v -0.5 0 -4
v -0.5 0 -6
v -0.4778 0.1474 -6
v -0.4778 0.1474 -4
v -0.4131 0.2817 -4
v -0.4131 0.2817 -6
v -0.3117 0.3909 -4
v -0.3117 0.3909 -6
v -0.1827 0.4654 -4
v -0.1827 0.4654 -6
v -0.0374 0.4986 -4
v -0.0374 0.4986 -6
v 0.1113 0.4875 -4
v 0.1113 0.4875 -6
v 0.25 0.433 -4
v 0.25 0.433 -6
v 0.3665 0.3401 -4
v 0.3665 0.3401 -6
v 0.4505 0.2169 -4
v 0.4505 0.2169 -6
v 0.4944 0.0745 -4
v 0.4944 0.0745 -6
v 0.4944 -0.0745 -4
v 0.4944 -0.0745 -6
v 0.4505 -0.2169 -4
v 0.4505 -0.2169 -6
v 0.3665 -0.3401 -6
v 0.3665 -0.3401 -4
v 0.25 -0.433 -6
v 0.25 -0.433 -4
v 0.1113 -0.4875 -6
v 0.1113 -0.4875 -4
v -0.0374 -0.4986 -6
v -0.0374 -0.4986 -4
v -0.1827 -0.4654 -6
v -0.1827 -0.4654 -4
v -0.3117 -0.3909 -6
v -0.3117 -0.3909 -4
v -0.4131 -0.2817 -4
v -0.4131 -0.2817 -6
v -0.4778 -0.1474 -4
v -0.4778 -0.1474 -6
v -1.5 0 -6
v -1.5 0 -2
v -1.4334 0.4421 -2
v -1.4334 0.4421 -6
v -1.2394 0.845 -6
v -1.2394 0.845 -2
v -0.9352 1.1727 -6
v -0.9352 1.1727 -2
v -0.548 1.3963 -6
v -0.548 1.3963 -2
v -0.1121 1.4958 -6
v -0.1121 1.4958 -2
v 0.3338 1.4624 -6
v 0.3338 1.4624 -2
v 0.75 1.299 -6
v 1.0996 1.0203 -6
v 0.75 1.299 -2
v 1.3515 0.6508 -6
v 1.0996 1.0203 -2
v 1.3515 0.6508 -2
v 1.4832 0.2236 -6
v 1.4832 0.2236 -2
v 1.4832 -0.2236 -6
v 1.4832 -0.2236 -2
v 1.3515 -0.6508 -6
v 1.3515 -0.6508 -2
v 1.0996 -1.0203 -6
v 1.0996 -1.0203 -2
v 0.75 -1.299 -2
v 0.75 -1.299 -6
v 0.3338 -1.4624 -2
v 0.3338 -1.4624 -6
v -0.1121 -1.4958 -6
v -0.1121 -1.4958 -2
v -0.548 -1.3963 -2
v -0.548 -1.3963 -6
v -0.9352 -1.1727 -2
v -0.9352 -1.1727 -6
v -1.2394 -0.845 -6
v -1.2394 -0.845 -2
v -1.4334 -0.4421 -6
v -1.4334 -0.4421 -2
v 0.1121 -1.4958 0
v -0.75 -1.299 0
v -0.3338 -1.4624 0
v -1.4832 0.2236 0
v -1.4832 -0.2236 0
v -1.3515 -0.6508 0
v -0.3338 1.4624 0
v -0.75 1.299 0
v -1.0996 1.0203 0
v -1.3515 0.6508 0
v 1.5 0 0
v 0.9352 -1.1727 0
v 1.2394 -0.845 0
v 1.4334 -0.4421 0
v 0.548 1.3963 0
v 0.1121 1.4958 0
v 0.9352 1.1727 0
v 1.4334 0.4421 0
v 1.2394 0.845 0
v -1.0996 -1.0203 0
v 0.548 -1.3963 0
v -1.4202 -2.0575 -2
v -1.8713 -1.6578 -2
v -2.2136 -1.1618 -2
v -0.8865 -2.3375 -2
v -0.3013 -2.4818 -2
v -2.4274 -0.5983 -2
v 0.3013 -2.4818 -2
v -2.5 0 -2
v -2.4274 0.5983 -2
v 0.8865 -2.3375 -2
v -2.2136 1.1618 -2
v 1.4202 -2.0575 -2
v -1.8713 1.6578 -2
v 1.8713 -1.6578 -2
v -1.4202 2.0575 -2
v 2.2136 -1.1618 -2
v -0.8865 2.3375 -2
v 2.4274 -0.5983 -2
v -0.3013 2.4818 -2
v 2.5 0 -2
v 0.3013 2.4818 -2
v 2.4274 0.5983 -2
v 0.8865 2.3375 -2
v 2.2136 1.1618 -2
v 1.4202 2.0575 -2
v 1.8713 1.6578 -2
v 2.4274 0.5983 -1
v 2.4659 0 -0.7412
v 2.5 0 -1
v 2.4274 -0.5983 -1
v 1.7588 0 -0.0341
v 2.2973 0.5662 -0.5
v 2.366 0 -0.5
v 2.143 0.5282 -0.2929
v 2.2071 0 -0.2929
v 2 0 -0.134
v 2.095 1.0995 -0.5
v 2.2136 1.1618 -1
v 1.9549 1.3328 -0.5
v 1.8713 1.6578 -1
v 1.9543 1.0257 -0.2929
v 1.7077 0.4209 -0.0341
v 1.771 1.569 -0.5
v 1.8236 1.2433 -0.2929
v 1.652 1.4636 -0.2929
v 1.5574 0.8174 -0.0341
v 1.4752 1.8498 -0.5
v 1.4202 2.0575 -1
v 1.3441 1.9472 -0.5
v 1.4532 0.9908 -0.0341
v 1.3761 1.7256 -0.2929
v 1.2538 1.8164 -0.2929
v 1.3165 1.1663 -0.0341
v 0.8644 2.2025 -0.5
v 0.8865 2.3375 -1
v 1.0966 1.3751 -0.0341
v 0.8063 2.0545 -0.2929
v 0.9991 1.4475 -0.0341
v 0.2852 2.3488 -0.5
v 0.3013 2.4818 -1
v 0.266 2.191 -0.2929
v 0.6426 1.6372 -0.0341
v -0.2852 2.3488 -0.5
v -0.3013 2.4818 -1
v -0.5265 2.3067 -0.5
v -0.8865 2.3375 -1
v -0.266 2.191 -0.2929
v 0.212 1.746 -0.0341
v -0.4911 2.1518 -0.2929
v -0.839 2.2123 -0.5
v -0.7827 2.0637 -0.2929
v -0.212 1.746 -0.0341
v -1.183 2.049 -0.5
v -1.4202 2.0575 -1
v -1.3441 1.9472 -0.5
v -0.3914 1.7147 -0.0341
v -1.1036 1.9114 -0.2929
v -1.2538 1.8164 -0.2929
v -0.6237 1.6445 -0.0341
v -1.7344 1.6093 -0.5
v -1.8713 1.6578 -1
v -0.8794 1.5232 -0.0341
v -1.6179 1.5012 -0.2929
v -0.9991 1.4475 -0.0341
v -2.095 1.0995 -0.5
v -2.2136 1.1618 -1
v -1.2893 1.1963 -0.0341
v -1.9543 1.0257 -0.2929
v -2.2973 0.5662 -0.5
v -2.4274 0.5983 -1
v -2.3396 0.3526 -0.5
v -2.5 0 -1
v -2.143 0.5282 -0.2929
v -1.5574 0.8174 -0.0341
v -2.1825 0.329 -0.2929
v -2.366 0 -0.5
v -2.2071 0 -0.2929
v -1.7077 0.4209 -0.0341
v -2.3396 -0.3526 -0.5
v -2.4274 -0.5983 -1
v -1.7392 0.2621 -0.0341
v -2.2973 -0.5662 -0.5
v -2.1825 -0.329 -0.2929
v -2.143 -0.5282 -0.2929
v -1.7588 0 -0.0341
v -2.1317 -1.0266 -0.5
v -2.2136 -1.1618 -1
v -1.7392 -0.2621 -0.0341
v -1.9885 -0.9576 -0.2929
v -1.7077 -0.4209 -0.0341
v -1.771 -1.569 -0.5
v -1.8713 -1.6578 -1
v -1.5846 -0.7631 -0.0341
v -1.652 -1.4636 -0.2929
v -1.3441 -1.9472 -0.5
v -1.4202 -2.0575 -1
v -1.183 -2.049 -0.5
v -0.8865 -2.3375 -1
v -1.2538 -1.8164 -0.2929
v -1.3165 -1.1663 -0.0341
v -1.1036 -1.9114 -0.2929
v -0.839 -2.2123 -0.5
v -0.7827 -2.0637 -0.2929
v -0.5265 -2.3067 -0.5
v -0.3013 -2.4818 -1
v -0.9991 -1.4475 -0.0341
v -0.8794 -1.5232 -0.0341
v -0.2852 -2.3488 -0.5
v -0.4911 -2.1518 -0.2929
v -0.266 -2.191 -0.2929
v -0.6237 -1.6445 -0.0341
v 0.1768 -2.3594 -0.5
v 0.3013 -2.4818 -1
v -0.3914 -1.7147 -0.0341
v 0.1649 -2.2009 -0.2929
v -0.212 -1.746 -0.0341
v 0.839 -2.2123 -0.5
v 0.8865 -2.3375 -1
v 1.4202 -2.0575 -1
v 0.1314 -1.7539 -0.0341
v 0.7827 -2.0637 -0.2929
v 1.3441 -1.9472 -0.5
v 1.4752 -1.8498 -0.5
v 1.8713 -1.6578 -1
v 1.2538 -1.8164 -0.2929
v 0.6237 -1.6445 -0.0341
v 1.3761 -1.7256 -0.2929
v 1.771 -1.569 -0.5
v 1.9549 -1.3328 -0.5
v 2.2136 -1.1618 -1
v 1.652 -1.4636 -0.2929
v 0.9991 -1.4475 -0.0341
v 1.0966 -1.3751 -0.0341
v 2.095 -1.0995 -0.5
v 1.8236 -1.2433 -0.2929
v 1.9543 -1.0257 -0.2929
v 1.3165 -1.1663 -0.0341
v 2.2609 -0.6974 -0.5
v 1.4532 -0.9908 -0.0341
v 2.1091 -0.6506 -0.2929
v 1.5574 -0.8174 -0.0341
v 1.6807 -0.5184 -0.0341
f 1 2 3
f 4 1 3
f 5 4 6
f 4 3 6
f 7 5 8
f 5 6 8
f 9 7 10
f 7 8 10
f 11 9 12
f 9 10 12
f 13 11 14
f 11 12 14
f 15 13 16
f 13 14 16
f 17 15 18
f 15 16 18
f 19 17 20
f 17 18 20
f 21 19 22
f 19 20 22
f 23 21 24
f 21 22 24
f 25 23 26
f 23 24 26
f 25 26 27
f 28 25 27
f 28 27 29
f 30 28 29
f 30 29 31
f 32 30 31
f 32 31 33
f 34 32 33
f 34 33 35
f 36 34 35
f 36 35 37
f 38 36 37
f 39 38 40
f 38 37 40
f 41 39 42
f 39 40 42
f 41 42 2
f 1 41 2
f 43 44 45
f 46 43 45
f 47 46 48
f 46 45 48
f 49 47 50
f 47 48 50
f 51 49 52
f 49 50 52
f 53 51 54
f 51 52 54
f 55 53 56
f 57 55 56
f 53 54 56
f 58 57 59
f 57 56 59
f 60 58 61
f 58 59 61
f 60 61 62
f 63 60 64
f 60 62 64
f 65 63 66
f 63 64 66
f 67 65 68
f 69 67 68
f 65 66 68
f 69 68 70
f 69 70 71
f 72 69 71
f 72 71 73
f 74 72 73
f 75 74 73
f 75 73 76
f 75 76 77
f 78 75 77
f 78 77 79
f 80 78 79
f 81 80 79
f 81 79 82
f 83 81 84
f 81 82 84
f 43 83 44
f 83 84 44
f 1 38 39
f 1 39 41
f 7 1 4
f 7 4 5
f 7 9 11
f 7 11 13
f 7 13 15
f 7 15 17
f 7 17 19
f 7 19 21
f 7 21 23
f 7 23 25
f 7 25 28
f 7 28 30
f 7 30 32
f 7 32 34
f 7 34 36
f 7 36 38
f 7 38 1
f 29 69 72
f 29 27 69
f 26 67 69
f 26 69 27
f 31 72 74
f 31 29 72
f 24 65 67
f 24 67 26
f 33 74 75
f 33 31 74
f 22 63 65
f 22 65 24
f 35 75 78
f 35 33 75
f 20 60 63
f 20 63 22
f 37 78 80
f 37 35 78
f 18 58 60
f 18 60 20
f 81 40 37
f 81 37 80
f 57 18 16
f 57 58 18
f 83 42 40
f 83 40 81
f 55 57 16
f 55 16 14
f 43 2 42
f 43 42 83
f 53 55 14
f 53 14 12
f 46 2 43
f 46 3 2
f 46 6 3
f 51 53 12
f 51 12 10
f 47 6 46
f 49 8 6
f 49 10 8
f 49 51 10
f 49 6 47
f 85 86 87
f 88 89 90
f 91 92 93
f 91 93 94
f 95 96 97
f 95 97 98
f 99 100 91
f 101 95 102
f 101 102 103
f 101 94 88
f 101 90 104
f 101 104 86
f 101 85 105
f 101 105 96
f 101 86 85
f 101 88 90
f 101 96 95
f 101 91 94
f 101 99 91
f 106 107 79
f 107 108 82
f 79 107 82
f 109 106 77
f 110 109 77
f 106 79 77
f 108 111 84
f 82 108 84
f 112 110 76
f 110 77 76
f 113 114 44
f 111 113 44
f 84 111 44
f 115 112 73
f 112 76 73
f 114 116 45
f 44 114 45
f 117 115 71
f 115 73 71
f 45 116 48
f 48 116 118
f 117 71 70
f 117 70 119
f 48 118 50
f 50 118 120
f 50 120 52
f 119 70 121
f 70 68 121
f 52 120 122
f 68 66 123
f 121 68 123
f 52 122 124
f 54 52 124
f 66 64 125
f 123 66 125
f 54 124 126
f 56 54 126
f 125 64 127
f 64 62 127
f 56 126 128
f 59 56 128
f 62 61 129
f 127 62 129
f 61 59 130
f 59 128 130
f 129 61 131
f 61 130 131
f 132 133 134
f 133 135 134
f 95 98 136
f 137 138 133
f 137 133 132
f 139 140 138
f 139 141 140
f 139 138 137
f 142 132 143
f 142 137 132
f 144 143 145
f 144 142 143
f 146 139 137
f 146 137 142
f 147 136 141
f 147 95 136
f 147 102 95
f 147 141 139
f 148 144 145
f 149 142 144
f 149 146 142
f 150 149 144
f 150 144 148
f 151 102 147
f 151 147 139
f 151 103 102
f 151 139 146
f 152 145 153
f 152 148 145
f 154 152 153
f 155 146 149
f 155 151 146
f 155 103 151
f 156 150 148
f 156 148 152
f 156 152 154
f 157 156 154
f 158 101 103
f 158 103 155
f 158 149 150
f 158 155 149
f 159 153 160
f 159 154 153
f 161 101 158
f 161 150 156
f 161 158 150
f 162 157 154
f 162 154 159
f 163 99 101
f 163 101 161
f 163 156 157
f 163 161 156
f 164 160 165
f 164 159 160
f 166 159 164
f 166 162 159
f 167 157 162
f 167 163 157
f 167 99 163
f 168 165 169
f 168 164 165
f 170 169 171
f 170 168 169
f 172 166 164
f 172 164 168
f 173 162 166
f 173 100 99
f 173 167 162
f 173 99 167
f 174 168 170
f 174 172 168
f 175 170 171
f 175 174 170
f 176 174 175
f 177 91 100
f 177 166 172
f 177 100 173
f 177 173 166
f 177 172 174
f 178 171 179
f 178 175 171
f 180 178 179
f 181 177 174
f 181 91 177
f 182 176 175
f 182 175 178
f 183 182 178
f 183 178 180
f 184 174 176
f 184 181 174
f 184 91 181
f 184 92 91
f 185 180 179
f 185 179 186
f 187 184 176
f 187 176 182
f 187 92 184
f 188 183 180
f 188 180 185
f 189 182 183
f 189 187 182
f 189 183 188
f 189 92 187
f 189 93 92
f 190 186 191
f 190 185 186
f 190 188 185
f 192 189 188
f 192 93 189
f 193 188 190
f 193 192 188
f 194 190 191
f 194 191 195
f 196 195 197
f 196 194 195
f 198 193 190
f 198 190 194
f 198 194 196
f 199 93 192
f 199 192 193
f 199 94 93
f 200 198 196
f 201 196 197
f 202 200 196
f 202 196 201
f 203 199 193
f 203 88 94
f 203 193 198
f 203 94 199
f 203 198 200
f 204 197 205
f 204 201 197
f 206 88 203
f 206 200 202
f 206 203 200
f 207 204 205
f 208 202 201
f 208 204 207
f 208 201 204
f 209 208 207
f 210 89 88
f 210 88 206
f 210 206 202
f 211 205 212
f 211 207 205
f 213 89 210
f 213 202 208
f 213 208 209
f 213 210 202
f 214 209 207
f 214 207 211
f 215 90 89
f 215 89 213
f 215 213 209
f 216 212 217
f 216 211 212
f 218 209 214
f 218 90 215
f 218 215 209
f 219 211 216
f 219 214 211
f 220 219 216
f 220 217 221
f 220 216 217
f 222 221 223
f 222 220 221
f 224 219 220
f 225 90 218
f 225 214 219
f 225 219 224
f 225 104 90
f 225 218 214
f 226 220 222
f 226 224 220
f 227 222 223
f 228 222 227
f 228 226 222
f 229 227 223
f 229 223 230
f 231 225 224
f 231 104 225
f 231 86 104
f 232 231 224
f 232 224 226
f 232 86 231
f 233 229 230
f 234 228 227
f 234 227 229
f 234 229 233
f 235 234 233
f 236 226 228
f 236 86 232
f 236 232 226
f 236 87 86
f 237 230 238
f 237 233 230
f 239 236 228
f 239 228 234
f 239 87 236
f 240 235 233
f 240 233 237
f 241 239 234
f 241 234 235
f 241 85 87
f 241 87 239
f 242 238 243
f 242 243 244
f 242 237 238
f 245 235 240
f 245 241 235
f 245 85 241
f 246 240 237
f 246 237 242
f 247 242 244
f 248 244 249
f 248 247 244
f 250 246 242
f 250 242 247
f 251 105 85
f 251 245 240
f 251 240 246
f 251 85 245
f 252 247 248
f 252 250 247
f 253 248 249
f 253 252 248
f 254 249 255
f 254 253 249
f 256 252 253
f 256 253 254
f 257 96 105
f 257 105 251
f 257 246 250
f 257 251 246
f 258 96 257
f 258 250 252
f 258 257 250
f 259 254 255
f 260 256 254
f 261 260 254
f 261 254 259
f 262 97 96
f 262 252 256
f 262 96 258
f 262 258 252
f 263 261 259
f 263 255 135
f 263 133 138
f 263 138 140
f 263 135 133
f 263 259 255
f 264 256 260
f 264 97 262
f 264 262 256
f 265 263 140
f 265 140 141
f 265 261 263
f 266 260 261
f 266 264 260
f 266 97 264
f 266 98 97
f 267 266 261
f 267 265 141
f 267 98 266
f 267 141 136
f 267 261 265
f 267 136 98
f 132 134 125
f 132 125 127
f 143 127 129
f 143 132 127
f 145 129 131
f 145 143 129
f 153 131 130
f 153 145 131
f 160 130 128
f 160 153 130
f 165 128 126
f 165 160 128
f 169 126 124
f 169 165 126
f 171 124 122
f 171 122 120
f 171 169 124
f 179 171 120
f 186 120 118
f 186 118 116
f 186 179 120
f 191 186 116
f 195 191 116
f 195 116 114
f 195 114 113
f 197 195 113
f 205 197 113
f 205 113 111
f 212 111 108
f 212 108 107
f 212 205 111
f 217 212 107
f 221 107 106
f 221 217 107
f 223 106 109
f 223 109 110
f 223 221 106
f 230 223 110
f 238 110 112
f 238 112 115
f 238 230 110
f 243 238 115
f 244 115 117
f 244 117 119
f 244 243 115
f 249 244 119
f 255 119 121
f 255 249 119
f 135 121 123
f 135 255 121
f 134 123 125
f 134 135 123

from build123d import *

# Parameters (mm, degrees)
SKETCH1_R           = 2.5
BOSS_EXTRUDE1_DEPTH = 2
SKETCH2_R           = 1.5
BOSS_EXTRUDE2_DEPTH = 4
FILLET2_R           = 1
SKETCH3_R           = 0.5
CUT_EXTRUDE1_DEPTH  = 2


with BuildPart() as part:
    # Sketch1 → Boss-Extrude1 (new body)
    with BuildSketch(Plane.XY):
        Circle(SKETCH1_R)
    extrude(amount=-BOSS_EXTRUDE1_DEPTH)

    # Sketch2 → Boss-Extrude2 (add)
    with BuildSketch(Plane(origin=(0, 0, -2), x_dir=(-1, 0, 0), z_dir=(0, 0, -1))):
        Circle(SKETCH2_R)
    extrude(amount=BOSS_EXTRUDE2_DEPTH)

    # Fillet2
    fillet2_edges = [part.edges().sort_by_distance(p)[0] for p in [
        (-2.5, 0, 0),
    ]]
    fillet(fillet2_edges, radius=FILLET2_R)

    # Sketch3 → Cut-Extrude1 (cut)
    with BuildSketch(Plane(origin=(0, 0, -6), x_dir=(-1, 0, 0), z_dir=(0, 0, -1))):
        Circle(SKETCH3_R)
    extrude(amount=-CUT_EXTRUDE1_DEPTH, mode=Mode.SUBTRACT)


solid = part.part
